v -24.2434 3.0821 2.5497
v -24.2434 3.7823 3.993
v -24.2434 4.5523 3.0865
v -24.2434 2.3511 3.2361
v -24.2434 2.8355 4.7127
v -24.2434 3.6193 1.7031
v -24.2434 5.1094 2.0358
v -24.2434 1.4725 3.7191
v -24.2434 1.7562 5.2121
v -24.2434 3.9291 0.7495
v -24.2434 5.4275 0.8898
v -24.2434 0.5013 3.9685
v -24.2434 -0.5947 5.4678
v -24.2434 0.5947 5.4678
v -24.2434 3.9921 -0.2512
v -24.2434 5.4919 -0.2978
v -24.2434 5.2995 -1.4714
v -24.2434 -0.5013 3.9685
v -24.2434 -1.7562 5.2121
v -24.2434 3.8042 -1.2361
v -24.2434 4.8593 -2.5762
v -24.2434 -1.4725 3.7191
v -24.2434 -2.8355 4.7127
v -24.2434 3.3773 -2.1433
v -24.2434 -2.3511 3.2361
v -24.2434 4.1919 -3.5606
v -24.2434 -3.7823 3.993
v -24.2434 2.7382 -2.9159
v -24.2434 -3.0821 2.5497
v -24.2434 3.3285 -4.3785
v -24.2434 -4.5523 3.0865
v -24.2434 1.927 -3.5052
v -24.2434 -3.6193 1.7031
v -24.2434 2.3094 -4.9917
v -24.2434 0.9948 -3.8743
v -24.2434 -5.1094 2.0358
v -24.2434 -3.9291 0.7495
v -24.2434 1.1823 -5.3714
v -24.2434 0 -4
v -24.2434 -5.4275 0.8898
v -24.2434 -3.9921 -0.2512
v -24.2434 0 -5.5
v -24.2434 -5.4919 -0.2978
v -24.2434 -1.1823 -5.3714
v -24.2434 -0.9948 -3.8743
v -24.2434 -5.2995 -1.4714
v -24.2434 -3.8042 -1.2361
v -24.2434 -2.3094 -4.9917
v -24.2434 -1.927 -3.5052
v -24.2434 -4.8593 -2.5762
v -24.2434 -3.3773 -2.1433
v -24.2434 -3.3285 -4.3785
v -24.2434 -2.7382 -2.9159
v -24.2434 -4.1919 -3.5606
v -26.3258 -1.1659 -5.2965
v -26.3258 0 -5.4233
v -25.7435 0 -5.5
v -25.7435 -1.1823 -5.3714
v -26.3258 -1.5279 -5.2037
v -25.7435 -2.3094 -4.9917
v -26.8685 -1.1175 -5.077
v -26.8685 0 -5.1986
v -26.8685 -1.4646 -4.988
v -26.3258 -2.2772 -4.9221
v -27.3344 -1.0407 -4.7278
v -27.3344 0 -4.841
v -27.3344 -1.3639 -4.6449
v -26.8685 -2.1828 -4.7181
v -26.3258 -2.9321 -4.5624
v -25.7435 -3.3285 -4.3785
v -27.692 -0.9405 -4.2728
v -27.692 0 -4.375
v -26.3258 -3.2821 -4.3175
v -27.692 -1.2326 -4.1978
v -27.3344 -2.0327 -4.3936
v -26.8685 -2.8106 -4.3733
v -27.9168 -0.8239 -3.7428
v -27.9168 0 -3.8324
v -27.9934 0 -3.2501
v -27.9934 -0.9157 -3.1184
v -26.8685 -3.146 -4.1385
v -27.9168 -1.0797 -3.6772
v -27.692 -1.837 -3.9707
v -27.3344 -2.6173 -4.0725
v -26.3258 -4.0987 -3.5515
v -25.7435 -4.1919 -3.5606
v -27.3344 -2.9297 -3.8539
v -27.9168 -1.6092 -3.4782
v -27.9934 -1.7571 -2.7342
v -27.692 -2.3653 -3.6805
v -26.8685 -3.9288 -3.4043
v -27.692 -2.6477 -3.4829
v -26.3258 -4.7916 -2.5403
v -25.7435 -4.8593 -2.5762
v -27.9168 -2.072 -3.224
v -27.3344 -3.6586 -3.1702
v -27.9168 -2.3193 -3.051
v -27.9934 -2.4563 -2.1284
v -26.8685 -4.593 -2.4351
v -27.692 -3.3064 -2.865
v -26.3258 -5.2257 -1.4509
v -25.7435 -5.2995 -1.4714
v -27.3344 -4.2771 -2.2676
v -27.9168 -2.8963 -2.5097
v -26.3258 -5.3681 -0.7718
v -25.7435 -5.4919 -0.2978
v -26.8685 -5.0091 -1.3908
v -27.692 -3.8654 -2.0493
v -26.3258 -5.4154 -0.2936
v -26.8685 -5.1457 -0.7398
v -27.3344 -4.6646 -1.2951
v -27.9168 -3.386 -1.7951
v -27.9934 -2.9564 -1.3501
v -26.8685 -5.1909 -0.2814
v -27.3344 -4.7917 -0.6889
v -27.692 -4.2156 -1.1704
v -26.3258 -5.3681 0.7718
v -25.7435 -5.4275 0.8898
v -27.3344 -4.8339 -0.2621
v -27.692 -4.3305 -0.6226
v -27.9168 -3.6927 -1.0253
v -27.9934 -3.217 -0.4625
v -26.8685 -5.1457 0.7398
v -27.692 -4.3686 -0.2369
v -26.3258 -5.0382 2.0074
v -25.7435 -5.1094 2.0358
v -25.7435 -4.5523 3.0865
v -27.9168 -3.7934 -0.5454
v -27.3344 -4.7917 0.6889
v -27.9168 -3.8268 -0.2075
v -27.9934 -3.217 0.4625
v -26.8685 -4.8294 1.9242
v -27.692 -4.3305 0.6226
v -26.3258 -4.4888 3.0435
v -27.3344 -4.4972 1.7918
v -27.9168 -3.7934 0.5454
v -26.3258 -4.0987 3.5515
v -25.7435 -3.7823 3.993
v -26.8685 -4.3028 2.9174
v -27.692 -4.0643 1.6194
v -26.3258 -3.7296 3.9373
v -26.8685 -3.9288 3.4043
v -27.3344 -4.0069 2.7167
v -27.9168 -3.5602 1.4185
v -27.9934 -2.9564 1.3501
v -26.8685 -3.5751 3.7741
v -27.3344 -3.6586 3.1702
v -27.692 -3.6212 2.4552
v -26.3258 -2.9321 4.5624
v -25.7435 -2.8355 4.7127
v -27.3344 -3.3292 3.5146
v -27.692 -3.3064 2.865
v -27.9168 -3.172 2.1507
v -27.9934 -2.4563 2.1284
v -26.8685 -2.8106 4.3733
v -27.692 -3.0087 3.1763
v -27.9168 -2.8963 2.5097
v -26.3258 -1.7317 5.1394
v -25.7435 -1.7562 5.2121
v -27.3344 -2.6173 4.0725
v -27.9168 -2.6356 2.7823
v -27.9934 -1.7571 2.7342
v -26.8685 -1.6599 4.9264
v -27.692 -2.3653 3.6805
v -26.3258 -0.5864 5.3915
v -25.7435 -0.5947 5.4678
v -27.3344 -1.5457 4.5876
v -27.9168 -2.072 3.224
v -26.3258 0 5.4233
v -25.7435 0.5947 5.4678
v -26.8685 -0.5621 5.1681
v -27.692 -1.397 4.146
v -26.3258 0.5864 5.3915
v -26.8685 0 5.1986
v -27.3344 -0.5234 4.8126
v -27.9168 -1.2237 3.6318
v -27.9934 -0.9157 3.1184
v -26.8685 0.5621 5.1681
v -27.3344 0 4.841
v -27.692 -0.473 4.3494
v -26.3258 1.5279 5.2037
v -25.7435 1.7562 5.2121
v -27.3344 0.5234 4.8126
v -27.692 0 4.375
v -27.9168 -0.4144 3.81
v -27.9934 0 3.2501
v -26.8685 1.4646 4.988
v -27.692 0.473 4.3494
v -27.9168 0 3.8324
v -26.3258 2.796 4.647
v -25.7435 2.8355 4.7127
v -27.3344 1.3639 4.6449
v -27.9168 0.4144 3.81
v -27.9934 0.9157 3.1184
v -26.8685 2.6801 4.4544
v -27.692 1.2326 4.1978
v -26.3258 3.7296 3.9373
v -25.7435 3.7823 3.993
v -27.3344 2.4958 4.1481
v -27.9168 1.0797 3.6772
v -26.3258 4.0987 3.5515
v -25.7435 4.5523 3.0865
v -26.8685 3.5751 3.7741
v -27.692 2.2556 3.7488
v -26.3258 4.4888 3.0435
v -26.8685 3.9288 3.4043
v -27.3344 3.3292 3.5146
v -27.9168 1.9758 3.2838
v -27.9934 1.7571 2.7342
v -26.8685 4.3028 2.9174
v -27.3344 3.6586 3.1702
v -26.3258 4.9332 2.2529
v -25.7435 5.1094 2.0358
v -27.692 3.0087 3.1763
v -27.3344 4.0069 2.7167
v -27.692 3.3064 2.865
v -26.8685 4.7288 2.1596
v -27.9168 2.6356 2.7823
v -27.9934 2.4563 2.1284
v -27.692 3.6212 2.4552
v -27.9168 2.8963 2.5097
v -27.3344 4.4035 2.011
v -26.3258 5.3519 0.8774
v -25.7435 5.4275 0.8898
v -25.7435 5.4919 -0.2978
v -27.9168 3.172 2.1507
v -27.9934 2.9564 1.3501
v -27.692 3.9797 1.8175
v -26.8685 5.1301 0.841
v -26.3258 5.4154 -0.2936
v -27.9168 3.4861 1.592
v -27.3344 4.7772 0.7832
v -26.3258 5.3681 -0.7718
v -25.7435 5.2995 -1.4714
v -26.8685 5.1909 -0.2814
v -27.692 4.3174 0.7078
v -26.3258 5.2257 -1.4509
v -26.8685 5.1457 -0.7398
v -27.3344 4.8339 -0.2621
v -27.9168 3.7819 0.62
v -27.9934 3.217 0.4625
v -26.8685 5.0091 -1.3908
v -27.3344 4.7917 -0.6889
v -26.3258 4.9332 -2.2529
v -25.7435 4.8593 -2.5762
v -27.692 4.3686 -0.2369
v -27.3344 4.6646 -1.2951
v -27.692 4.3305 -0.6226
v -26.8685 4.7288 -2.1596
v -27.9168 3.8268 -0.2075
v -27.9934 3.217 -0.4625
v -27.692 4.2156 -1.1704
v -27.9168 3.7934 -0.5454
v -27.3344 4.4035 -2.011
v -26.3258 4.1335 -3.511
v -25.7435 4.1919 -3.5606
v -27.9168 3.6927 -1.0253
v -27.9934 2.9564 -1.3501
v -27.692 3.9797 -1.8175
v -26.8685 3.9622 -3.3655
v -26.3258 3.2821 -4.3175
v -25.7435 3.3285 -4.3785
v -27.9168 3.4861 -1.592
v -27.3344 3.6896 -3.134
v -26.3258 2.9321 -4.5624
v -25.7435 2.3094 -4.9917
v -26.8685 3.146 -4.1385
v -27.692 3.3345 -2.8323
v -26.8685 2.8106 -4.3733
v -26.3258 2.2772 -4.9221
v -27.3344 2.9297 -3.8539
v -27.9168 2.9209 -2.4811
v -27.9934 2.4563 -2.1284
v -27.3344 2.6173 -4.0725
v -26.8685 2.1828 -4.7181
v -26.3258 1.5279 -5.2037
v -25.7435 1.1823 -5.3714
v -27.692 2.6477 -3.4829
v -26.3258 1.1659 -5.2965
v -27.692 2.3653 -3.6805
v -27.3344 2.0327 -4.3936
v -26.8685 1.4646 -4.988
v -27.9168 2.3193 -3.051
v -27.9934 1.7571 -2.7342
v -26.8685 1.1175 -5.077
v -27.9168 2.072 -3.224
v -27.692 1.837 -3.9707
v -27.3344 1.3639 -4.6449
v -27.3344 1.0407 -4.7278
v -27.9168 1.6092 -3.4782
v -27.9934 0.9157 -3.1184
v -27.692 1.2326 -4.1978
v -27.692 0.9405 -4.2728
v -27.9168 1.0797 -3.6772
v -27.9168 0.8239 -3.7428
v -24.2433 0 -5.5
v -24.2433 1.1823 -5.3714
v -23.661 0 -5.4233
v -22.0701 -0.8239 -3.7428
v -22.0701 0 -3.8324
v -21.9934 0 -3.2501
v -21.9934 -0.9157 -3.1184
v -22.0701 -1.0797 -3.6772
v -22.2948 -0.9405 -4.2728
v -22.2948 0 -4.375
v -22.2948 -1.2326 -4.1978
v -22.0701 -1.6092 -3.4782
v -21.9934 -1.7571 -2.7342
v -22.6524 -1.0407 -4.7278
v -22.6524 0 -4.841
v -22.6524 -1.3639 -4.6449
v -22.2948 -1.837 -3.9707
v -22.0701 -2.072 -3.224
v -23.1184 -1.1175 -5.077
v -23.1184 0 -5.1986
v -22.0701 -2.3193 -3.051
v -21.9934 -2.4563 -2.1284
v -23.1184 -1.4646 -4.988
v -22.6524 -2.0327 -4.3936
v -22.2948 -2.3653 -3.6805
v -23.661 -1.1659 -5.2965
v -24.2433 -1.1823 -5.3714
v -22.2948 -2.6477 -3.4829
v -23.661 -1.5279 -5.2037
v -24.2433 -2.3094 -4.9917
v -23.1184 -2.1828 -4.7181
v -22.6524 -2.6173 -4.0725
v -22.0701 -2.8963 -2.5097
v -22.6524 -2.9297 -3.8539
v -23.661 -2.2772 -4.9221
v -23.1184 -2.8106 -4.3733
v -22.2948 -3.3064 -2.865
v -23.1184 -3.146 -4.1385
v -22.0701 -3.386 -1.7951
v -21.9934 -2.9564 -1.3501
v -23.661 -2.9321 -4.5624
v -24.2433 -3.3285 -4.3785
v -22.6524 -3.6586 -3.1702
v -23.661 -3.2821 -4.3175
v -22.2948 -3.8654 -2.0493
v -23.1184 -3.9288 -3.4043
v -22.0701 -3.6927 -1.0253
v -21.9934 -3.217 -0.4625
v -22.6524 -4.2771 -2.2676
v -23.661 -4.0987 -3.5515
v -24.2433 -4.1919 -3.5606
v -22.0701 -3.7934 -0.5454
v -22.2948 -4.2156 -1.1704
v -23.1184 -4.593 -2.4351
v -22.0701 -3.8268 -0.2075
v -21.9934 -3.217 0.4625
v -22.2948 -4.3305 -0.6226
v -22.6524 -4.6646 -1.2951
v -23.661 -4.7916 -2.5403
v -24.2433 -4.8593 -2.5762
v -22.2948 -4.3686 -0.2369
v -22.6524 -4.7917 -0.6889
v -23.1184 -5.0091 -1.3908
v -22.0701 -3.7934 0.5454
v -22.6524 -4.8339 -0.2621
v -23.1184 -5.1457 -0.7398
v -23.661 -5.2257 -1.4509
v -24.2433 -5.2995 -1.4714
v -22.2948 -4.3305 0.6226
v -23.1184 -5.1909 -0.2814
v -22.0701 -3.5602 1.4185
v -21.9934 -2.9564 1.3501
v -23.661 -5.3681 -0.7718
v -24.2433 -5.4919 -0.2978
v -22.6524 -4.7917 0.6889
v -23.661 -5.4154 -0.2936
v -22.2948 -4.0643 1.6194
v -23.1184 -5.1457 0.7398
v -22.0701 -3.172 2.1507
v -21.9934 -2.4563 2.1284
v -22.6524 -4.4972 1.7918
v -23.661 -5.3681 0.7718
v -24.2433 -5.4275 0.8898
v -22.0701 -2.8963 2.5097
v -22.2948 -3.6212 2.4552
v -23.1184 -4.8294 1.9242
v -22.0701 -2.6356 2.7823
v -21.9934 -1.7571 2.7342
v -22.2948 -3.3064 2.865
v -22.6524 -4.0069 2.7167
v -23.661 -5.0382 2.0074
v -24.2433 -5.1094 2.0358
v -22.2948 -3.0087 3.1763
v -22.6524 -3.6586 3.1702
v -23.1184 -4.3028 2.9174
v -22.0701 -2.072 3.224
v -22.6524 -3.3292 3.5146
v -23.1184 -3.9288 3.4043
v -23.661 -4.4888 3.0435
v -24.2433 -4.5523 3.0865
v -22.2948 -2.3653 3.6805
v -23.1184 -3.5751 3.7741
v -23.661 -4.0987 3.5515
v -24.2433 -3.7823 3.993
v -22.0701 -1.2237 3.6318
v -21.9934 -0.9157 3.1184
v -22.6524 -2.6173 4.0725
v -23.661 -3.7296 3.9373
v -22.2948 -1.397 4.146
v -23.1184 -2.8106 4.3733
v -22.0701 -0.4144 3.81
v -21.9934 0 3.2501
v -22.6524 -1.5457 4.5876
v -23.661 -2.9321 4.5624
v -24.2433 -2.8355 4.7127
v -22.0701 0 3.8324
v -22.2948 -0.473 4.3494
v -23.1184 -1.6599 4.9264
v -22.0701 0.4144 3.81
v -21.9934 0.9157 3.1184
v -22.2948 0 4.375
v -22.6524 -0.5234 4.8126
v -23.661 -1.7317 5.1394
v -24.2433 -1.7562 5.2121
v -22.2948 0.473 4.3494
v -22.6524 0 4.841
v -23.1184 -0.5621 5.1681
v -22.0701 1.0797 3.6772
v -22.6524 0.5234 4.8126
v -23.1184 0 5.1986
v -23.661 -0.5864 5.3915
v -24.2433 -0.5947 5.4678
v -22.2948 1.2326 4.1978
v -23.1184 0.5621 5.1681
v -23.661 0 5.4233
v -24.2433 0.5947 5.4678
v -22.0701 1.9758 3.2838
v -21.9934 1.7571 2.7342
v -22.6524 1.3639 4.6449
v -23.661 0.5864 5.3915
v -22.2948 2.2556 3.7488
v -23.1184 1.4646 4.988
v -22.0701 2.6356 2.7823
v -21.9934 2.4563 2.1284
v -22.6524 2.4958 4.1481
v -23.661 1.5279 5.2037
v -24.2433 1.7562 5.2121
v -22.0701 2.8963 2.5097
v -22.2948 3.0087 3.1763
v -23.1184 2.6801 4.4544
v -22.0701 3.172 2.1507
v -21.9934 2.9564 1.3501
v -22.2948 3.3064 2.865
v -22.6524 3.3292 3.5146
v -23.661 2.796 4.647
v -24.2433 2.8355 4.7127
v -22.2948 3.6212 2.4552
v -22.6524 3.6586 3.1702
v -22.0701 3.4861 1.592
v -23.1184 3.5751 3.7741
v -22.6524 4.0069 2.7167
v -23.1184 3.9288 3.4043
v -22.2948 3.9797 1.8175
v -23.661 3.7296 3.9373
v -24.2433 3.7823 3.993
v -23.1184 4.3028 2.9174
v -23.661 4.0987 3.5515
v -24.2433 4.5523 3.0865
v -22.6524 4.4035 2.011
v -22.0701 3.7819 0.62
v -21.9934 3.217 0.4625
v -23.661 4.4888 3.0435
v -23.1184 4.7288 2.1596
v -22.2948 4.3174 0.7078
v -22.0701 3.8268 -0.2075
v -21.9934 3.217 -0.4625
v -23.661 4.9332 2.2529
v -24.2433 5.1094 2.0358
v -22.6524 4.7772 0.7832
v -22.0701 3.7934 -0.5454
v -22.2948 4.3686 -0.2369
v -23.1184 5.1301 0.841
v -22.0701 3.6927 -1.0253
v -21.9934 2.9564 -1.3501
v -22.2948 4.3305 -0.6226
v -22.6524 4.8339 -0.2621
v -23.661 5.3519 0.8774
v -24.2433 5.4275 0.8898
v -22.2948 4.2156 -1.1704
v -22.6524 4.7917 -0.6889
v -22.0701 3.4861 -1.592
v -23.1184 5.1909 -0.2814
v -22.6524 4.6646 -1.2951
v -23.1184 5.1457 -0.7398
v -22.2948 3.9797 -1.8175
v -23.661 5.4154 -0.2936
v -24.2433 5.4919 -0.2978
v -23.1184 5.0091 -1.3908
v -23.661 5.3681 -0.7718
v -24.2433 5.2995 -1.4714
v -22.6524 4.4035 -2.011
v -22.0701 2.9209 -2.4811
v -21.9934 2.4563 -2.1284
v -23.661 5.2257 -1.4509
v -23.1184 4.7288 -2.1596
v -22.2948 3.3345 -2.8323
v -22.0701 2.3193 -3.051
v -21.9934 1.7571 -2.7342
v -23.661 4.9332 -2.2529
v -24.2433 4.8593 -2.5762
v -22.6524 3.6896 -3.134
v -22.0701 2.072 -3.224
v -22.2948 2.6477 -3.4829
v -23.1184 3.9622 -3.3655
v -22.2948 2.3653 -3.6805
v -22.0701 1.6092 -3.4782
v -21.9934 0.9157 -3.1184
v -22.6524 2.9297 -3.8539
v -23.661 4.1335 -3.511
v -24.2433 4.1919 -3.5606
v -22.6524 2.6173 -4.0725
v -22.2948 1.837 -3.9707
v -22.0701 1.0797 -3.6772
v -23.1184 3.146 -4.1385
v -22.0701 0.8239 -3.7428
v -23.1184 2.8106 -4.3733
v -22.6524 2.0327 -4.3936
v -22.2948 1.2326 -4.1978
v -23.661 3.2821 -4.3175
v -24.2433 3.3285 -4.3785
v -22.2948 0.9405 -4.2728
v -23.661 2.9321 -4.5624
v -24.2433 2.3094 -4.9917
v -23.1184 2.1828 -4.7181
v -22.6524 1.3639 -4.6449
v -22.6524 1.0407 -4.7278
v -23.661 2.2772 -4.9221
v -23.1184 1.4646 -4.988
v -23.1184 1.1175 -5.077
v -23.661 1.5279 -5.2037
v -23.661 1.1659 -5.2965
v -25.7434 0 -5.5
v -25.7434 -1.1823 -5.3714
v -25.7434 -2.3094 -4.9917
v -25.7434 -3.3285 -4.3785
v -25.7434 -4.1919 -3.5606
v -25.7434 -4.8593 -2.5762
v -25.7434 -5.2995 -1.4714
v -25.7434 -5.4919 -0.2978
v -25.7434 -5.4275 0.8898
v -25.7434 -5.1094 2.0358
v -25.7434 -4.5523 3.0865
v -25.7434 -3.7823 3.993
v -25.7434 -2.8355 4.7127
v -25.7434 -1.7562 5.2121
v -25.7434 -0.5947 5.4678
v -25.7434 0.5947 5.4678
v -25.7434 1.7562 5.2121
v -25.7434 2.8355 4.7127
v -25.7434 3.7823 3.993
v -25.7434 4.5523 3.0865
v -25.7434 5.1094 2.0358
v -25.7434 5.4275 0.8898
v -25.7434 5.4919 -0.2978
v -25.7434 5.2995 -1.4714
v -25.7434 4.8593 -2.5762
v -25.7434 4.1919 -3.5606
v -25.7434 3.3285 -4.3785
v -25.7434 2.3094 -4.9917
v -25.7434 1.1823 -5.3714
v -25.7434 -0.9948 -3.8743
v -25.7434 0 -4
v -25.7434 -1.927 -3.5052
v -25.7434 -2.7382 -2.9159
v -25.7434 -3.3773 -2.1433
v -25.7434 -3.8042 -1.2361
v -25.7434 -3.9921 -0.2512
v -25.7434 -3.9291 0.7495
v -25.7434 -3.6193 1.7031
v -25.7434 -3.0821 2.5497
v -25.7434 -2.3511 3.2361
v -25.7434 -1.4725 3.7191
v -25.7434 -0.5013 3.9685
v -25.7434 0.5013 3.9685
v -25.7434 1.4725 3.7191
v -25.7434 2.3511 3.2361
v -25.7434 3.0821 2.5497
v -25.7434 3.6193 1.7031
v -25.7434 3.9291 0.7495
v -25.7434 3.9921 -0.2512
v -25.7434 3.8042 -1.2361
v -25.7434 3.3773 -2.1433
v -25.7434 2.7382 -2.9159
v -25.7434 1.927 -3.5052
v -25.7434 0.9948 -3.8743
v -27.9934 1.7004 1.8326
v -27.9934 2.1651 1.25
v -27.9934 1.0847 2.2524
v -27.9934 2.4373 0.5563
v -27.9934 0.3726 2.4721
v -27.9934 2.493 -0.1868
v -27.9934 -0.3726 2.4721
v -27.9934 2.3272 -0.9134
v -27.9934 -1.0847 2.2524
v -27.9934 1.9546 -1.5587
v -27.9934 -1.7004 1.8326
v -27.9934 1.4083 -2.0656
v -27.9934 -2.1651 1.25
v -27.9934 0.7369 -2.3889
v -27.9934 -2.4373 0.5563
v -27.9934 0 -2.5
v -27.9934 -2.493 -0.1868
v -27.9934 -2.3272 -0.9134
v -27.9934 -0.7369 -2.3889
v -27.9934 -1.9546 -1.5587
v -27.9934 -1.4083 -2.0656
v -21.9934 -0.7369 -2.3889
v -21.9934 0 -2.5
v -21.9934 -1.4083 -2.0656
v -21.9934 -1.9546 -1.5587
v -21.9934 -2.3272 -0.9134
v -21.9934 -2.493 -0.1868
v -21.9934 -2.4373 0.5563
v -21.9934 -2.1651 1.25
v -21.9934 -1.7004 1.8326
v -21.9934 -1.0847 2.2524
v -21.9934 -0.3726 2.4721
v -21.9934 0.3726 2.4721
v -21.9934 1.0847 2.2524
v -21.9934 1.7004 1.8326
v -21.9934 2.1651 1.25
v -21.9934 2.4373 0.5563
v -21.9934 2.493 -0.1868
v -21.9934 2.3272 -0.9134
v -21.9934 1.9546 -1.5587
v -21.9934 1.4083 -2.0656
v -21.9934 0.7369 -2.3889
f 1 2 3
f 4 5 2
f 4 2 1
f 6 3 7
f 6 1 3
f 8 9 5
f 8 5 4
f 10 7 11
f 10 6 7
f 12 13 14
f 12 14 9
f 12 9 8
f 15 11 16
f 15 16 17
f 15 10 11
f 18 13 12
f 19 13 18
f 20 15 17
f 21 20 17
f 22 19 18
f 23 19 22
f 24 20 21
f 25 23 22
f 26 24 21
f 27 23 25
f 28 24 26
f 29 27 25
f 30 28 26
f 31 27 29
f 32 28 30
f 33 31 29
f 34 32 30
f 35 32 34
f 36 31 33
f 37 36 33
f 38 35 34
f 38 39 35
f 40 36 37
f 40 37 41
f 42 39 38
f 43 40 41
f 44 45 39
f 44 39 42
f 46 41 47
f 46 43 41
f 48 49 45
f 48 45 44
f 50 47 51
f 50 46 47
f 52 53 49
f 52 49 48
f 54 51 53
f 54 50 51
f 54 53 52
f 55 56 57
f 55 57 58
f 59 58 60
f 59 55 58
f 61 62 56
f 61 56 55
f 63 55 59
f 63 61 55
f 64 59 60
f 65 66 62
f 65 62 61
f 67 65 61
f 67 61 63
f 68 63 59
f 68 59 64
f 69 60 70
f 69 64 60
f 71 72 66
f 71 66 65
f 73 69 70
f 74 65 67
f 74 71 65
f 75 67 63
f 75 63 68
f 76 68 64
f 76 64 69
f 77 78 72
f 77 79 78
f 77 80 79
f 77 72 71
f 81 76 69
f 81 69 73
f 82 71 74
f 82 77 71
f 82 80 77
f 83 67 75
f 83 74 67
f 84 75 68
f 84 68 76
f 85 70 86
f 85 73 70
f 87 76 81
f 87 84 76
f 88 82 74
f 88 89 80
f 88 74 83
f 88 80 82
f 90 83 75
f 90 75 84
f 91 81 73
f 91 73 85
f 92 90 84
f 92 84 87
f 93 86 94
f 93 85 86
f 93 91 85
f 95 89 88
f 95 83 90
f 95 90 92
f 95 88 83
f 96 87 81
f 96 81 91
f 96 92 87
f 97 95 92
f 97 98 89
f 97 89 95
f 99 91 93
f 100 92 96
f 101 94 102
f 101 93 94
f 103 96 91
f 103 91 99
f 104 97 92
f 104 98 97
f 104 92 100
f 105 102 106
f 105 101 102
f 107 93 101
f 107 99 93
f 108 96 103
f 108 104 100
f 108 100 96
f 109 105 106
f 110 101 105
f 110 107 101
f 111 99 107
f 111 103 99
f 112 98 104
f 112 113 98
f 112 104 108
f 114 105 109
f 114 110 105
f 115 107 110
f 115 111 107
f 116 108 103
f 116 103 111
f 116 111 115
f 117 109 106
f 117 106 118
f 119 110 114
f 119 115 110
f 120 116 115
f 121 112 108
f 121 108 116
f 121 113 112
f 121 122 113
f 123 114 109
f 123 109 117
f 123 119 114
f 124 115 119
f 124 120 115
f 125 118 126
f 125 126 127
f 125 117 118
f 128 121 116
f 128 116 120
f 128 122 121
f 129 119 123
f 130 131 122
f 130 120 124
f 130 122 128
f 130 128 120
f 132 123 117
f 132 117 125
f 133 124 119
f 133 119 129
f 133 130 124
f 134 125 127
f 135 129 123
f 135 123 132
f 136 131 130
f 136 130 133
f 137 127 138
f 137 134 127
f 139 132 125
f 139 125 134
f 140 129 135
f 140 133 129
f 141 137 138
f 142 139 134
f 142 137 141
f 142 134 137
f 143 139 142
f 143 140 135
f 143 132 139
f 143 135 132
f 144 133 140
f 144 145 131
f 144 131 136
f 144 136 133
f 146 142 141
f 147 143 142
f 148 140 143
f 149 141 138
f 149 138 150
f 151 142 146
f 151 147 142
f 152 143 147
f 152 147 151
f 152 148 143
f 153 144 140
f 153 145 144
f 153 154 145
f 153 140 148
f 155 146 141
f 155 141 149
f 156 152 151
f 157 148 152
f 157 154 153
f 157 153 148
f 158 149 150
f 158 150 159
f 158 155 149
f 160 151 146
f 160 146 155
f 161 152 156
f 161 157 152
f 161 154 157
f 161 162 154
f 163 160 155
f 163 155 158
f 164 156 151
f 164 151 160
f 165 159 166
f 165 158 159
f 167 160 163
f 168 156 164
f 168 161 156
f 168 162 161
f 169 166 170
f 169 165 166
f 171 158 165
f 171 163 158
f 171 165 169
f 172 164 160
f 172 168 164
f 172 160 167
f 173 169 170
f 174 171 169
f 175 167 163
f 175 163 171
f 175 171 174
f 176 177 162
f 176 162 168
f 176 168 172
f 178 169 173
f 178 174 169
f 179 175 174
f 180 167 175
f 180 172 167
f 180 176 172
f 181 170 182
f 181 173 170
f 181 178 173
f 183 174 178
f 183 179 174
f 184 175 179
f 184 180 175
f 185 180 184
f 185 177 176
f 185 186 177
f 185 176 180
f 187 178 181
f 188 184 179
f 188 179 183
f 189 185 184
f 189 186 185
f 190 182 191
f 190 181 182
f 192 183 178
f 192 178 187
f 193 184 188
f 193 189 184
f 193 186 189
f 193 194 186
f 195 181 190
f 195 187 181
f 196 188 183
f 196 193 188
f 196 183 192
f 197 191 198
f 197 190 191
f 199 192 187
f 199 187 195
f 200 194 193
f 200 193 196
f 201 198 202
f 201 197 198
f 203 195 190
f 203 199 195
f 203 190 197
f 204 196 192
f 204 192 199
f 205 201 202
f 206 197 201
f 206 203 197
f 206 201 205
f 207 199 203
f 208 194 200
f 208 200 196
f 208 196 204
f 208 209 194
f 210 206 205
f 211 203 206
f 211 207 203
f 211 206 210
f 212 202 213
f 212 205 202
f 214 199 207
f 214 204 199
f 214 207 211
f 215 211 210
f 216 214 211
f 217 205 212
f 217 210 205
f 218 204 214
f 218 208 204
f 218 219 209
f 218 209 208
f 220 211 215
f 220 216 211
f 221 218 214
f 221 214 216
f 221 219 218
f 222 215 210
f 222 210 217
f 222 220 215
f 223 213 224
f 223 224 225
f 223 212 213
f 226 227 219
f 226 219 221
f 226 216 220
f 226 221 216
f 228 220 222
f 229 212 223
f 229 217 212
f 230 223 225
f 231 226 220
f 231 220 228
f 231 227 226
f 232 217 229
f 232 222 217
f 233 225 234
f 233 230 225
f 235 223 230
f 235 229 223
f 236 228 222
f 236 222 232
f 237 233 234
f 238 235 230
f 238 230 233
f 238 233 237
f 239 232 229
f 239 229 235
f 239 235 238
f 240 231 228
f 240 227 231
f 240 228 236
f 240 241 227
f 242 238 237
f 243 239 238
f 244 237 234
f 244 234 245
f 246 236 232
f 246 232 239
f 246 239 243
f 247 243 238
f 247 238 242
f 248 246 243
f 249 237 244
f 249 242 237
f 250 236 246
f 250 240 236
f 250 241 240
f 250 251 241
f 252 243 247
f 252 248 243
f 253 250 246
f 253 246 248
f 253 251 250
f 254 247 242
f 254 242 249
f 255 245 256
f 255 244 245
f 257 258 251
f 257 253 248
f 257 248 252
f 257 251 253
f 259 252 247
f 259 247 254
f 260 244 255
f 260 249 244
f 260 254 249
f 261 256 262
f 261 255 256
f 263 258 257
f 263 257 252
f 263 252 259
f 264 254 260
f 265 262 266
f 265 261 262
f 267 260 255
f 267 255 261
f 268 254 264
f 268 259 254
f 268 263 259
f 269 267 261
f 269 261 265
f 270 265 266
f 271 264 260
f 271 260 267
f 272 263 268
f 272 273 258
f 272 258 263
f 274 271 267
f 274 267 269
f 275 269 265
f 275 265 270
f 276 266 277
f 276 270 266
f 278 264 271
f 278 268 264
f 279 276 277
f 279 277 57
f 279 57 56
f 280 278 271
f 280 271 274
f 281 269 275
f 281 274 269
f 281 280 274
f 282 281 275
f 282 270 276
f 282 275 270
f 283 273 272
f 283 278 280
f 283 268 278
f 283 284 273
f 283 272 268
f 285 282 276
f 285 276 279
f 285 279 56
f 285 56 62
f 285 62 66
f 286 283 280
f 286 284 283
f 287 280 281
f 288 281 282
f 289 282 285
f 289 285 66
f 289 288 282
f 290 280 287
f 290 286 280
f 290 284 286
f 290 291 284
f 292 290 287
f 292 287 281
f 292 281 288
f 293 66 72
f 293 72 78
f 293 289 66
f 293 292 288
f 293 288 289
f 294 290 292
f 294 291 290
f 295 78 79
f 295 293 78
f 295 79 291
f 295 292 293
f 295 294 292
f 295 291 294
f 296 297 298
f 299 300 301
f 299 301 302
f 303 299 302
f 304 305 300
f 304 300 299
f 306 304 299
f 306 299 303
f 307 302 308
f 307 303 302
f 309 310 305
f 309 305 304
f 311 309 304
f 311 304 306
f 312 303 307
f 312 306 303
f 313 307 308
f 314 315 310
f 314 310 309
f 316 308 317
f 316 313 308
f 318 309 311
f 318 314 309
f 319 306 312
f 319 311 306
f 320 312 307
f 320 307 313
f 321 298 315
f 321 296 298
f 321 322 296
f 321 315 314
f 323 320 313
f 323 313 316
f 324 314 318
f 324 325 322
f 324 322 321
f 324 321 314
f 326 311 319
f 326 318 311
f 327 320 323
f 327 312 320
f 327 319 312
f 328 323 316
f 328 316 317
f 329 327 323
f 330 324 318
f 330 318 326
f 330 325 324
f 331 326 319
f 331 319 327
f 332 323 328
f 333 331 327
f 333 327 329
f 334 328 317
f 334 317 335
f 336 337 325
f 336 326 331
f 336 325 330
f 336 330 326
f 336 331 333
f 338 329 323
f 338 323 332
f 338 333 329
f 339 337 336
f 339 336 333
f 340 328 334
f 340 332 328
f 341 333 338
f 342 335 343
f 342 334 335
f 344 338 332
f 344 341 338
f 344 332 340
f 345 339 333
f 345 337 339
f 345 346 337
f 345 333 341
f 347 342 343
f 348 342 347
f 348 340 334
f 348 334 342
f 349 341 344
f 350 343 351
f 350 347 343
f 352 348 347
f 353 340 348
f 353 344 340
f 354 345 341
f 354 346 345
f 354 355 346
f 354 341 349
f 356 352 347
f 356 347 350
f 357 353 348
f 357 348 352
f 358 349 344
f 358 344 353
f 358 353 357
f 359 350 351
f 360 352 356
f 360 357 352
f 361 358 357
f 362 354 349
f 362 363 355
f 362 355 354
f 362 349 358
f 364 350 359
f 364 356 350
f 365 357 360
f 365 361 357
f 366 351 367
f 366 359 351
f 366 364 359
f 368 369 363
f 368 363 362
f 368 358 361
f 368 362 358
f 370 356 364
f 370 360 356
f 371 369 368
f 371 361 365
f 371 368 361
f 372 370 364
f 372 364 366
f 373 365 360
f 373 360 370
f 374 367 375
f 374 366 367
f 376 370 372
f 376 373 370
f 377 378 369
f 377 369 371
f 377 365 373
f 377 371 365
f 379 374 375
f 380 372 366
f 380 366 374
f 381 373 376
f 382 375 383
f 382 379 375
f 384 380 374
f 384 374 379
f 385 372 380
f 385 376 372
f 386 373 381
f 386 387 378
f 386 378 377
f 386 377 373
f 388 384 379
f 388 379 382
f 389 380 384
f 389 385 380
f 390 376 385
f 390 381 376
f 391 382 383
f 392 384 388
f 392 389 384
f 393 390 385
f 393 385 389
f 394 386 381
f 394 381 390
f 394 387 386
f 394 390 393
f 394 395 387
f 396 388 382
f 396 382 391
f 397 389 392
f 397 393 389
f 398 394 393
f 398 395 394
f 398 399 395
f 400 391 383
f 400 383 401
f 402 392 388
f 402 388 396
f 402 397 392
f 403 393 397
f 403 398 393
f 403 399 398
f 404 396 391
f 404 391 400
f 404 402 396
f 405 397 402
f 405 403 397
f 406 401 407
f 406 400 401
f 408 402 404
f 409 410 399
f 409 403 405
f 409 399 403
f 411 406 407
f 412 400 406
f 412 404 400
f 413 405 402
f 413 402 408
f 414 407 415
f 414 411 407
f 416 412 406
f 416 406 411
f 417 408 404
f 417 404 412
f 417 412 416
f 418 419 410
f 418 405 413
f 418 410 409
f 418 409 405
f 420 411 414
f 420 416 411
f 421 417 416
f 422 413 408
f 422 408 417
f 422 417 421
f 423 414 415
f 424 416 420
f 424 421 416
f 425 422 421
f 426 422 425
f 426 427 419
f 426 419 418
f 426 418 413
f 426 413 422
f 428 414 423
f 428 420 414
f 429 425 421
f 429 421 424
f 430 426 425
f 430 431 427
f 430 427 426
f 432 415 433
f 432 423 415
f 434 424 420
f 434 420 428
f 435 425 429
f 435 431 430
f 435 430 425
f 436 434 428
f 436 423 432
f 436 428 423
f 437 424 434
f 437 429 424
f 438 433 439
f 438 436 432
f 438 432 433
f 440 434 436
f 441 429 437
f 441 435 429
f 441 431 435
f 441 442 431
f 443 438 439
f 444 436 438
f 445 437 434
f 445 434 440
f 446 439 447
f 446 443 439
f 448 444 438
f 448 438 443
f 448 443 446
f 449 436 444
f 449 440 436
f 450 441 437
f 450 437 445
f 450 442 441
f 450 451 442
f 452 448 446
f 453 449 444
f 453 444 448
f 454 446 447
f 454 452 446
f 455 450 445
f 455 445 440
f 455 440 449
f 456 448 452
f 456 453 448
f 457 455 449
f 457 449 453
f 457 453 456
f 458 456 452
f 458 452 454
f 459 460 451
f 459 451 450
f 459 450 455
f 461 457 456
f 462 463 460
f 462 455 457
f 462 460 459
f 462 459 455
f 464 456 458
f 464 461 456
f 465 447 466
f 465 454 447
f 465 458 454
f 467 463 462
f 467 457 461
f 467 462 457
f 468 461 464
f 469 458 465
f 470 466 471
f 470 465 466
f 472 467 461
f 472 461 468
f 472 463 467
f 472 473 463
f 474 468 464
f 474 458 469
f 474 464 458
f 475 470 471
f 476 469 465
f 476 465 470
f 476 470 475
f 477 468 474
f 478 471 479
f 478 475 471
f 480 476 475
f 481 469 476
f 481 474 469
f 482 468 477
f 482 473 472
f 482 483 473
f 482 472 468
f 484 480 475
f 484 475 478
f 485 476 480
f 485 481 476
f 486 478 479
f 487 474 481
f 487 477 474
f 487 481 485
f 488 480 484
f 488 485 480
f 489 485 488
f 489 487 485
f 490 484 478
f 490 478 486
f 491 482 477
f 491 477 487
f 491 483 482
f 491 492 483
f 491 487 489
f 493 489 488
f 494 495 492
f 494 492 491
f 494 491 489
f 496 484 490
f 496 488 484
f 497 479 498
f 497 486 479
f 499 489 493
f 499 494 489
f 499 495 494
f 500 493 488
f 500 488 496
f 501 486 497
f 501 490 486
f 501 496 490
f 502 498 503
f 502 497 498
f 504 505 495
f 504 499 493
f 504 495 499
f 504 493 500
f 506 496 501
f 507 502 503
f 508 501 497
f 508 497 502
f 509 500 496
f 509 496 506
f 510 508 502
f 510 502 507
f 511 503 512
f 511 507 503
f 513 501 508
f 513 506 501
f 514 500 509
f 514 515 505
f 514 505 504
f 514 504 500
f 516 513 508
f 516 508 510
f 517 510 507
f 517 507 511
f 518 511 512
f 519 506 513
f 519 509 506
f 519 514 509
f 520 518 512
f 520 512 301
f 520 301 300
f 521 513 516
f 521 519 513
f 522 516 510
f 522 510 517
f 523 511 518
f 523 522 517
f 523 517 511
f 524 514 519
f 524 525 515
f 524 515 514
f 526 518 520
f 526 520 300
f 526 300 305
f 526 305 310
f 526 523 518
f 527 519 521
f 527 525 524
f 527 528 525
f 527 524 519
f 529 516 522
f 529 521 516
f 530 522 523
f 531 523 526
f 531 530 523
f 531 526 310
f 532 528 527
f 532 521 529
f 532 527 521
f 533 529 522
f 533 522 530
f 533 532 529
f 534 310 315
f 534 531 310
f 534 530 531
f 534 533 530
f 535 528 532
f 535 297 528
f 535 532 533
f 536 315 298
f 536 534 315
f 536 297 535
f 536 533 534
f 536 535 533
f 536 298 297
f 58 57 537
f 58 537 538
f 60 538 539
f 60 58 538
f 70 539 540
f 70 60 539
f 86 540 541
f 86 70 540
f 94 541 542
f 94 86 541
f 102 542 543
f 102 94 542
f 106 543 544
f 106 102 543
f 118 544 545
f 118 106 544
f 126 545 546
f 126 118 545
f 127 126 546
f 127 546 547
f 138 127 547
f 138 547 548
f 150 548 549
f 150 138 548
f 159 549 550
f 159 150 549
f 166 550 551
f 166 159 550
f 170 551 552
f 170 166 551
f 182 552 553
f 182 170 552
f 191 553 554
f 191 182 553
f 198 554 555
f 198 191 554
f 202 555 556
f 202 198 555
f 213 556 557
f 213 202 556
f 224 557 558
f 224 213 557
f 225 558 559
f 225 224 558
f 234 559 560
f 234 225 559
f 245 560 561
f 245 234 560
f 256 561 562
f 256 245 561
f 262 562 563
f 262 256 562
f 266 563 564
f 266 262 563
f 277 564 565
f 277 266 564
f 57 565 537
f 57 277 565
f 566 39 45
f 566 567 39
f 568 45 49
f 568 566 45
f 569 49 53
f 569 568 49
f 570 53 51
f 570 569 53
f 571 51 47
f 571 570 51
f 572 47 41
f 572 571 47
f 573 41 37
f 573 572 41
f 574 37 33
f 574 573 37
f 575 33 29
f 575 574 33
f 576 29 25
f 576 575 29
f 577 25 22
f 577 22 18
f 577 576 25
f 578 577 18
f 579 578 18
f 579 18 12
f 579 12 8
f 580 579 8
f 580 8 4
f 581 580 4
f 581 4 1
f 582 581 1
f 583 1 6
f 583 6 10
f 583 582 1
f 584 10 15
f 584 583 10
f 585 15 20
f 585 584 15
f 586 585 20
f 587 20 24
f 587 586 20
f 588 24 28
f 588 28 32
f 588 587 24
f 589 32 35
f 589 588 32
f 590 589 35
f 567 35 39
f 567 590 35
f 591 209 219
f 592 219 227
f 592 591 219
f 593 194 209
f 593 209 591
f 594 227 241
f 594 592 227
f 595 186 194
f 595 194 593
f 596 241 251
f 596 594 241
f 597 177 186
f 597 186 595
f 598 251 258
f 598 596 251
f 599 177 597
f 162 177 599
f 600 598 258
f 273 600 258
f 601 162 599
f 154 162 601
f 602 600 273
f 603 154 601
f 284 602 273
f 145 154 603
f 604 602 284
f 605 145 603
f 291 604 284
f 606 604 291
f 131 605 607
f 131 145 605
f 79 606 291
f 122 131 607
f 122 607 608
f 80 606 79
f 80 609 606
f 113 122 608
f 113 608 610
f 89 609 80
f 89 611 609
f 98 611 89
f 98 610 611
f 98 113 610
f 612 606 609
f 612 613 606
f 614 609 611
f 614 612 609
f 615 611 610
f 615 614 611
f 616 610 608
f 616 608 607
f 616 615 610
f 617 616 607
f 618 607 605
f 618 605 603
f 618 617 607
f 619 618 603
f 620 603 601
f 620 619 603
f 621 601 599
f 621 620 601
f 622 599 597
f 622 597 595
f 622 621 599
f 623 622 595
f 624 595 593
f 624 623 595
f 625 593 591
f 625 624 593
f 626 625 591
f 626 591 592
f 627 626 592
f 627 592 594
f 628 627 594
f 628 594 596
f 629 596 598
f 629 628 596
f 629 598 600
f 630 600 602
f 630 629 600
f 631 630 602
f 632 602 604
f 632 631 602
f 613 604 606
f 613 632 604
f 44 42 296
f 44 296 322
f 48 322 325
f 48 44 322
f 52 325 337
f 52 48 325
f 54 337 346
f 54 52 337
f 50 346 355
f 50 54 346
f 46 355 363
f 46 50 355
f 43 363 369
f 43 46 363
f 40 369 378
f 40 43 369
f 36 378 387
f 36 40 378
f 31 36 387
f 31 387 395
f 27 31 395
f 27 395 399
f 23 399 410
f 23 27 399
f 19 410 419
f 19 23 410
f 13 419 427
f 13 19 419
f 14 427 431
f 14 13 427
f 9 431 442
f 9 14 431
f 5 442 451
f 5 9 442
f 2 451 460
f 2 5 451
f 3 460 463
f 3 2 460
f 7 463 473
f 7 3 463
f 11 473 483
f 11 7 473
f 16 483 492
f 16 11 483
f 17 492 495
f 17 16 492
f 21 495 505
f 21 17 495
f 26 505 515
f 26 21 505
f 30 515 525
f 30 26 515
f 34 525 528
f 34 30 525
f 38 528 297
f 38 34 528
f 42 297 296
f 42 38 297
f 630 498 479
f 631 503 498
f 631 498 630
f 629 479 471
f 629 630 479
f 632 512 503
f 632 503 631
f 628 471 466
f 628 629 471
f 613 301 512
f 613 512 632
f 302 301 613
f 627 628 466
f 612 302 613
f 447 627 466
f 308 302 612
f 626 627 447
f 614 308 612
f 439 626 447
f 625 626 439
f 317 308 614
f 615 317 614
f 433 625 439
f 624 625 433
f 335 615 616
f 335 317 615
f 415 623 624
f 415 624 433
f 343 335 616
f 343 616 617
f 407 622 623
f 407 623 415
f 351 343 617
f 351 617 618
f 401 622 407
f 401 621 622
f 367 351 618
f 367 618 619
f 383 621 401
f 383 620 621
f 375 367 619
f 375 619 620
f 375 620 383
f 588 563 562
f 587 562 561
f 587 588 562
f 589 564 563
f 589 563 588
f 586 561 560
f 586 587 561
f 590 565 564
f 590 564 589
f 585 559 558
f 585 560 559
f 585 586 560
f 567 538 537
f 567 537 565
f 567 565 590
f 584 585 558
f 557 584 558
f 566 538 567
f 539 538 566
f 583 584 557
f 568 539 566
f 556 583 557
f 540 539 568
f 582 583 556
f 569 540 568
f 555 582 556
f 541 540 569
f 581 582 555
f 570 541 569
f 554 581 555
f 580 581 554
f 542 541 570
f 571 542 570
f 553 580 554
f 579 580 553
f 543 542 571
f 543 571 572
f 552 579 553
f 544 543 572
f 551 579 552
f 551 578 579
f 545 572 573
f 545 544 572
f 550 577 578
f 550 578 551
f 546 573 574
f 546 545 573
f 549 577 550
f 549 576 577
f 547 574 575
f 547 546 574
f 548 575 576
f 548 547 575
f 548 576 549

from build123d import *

# Parameters (mm, degrees)
CONG_1_R = 2.25


with BuildPart() as part:
    # Esquisse1 → Révolution1 (revolve)
    with BuildSketch(Plane.XY, mode=Mode.PRIVATE) as r_volution1_sk:
        Polygon((-27.993416317, 2.5), (-21.993416317, 2.5), (-21.993416317, 5.5), (-24.243416317, 5.5), (-24.243416317, 4), (-25.743416317, 4), (-25.743416317, 5.5), (-27.993416317, 5.5), align=None)
    revolve(r_volution1_sk.sketch.rotate(Axis((24.606805167, 0, 0), (-1, 0, 0)), 90), axis=Axis((24.606805167, 0, 0), (-1, 0, 0)))

    # Congé1
    cong_1_edges = [part.edges().sort_by_distance(p)[0] for p in [
        (-27.993416317, 0, 5.5),
        (-21.993416317, 0, 5.5),
    ]]
    fillet(cong_1_edges, radius=CONG_1_R - 0.0001)  # a hair under: the kernel refuses the full size


solid = part.part
